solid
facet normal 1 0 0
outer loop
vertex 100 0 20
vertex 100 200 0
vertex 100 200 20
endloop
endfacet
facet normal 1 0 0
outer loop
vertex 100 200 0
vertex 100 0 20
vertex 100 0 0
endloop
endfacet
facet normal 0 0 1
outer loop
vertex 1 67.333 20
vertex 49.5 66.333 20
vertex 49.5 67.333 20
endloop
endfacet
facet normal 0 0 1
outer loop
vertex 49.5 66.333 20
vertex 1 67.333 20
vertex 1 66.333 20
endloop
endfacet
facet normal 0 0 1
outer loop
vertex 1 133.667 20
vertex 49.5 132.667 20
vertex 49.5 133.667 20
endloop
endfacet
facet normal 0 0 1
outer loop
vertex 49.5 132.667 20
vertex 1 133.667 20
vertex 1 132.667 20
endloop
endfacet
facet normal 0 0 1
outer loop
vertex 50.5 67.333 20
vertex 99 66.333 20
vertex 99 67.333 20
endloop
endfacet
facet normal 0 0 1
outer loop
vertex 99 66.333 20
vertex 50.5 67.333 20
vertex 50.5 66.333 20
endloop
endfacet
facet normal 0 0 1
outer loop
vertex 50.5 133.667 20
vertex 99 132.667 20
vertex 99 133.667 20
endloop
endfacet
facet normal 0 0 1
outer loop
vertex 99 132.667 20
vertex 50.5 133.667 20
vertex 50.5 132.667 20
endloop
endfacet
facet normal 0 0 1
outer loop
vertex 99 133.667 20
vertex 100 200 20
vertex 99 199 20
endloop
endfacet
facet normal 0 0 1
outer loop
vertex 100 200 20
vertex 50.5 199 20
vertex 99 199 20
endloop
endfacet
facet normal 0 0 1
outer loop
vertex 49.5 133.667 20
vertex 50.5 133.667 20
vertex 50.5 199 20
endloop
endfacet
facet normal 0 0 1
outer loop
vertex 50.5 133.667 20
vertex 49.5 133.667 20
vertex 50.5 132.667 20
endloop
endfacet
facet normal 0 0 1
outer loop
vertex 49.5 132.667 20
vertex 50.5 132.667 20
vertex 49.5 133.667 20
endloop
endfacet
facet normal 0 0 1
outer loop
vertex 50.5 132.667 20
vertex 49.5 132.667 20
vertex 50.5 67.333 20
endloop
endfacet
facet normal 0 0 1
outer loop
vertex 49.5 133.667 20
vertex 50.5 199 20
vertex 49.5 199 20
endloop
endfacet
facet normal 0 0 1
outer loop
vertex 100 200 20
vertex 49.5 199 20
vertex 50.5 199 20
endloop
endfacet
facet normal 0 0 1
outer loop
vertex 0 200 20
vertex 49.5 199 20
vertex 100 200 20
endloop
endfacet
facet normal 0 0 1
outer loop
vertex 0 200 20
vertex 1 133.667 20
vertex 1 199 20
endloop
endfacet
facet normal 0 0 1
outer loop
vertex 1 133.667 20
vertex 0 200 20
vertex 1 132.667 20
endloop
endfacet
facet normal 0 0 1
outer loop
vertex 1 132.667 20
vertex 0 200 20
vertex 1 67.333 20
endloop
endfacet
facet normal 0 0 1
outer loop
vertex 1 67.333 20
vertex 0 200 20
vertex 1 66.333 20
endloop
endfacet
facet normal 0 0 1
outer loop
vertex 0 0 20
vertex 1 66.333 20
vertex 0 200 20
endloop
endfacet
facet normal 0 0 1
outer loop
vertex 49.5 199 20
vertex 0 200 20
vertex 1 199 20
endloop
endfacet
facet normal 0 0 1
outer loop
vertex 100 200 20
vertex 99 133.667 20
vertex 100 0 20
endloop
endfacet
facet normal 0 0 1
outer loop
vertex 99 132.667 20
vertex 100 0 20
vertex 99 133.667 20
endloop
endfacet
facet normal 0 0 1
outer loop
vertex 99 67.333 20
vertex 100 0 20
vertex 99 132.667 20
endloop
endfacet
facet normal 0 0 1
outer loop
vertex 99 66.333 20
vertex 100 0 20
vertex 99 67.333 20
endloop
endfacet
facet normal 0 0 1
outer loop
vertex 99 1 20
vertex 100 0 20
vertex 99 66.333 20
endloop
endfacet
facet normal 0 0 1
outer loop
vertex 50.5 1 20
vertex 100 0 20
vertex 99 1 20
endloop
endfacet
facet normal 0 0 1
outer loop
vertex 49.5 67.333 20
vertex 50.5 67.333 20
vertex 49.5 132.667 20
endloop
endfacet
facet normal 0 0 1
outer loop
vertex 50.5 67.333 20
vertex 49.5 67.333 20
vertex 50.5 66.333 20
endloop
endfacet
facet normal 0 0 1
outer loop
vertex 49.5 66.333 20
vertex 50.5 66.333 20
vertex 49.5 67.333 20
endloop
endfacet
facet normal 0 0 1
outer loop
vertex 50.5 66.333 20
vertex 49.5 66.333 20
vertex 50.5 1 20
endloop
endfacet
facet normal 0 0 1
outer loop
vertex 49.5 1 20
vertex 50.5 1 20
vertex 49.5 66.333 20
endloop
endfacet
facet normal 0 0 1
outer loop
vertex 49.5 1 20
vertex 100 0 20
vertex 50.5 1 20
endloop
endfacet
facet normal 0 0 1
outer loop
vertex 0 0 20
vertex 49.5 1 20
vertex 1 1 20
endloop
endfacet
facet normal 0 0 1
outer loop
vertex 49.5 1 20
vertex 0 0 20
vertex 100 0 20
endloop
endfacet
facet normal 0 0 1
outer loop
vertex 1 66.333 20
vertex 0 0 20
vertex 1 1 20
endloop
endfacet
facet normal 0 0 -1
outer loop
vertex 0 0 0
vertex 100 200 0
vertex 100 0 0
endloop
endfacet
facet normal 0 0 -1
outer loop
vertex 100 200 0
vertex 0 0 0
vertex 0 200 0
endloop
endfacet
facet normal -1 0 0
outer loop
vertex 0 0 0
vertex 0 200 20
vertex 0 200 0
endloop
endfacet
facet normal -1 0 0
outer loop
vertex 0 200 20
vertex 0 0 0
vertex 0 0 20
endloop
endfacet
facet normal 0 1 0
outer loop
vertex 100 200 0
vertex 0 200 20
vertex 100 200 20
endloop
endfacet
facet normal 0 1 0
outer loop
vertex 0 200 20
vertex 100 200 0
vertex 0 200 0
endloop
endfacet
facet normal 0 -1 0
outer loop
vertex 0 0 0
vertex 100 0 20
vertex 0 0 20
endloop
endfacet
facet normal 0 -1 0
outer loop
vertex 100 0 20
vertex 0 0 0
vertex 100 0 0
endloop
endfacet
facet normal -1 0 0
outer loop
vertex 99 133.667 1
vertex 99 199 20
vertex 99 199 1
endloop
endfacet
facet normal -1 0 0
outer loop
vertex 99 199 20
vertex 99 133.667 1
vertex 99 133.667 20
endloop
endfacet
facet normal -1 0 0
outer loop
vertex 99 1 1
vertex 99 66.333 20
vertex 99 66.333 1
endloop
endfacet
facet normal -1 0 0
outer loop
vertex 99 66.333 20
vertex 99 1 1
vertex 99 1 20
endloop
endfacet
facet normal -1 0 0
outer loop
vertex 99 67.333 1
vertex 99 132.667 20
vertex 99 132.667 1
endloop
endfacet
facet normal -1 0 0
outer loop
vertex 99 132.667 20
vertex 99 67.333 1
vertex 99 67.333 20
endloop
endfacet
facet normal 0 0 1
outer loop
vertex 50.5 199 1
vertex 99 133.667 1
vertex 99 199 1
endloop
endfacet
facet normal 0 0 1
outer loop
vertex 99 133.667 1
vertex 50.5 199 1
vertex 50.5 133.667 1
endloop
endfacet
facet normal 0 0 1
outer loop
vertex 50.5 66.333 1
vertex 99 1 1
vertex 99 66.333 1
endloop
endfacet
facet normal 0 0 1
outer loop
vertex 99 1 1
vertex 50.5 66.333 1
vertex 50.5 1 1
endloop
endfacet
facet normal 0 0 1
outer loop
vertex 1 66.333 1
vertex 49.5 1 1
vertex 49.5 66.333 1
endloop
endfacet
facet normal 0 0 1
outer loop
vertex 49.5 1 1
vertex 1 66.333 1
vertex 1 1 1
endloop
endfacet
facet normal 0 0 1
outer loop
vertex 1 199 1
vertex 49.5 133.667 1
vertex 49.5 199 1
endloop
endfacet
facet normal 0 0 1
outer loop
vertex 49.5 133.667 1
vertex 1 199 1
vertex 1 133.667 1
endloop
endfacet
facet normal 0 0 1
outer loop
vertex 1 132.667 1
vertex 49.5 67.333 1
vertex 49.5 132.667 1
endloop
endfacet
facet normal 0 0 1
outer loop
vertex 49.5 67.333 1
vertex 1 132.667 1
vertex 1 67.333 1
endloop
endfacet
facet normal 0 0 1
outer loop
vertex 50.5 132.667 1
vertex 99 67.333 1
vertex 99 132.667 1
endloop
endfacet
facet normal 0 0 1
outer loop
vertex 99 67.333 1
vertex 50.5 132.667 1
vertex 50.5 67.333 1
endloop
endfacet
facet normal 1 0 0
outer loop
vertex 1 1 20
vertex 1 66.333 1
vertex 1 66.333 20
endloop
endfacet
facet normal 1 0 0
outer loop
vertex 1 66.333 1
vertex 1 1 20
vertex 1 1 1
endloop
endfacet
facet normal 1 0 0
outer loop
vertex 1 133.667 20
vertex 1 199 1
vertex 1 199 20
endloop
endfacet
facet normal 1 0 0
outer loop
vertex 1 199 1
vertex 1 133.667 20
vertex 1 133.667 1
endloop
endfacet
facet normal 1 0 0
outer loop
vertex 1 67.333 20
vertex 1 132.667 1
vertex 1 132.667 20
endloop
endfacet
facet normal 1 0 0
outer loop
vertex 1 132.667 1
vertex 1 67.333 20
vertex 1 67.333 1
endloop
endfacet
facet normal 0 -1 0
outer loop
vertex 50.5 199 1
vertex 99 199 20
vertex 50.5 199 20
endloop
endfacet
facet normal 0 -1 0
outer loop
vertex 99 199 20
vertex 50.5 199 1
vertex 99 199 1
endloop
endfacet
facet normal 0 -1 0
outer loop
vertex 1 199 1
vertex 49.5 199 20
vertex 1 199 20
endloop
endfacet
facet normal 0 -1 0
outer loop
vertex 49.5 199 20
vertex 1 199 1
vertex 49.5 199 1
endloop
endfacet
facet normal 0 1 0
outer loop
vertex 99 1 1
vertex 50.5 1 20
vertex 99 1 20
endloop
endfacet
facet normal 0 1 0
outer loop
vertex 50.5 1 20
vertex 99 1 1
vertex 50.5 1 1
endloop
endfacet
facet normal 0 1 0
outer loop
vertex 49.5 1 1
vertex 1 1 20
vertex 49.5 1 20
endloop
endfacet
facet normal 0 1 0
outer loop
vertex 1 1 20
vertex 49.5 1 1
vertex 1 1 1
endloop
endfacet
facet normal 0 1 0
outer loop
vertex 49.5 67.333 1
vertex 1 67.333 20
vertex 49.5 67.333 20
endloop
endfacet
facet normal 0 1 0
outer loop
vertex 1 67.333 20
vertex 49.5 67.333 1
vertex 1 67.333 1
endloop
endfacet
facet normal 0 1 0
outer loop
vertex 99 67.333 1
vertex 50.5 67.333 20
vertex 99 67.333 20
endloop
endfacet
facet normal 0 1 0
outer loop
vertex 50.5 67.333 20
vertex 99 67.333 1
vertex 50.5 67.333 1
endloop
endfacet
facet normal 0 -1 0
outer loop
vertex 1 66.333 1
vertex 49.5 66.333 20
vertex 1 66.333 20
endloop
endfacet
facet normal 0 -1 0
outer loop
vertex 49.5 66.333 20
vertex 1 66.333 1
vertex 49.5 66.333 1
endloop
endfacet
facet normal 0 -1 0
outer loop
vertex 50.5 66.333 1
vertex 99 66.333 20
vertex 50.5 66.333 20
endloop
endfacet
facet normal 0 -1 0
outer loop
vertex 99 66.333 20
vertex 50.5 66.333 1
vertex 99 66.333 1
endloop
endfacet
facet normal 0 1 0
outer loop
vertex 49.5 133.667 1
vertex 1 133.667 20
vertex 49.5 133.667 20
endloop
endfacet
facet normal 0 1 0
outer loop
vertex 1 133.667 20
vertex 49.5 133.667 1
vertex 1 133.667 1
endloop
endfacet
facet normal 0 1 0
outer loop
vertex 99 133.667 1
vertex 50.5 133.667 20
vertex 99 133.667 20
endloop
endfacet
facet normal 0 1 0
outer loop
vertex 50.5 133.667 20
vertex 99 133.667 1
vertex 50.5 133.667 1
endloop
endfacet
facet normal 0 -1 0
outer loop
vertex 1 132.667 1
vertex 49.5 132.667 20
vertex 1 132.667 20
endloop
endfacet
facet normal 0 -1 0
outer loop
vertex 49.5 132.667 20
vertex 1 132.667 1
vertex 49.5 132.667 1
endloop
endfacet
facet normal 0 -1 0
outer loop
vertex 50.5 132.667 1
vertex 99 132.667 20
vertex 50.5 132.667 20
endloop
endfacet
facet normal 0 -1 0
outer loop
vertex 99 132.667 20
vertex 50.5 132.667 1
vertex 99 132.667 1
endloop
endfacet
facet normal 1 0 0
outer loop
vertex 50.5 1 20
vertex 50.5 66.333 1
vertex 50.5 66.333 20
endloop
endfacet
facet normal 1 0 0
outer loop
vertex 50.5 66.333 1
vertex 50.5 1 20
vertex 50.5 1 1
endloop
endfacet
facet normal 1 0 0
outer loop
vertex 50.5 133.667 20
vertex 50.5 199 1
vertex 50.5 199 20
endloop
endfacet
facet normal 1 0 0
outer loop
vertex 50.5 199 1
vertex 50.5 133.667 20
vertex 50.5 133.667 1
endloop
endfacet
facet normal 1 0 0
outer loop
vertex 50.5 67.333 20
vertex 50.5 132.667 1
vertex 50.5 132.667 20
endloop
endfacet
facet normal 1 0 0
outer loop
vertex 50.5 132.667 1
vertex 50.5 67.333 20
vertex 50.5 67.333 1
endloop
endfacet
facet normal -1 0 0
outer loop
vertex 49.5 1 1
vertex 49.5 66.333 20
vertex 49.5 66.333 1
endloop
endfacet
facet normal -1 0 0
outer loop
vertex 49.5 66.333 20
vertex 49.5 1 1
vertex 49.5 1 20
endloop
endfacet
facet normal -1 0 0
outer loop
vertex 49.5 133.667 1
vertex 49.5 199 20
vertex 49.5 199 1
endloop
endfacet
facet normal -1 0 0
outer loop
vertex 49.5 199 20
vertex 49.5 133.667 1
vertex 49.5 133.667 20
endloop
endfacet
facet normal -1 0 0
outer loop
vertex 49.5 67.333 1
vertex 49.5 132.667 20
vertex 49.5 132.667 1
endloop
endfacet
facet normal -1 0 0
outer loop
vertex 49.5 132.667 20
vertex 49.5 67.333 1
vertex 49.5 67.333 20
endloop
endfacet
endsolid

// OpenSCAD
// Tray width
tray_width = 100;
// Tray lenght
tray_lenght = 200;
// Tray depth
tray_depth = 20;
// Columns
n_columns = 3;
// Rows
n_rows = 2;
// Wall width
wall_width = 1;
dwall = wall_width*2;
// Columns lengths
columns = [];
// Rows widths
rows = [];

module slot(width, lenght, depth, wall) {
    difference() {
        cube([width, lenght, depth]);
        translate([wall, wall, wall]) cube([width-wall*2, lenght-wall*2, depth]);
    }
    
}

function add(v) = [for(p=v) 1]*v;
function add_up_to(v, range) = add([for(i=[0:range]) v[i]]);


// Check columns
if (len(columns) != 0) {
    if (len(columns) != n_columns) {
        echo ("Column lenghts not especified for every column.");
    }
    if (add(columns) != 100) {
        echo ("Column lenghts do not add 100.");
    }
}
// Check rows
if (len(rows) != 0) {
    if (len(rows) != n_rows) {
        echo ("Row widths not especified for every row.");
    }
    if (add(rows) != 100) {
        echo ("Ros widths do not add 100.");
    }
}

slot(tray_width, tray_lenght, tray_depth, wall_width);
// Draw rows
if (len(rows) == 0) {
    inner_width = (tray_width - (n_rows + 1)*wall_width) / n_rows;
    for (r = [1:n_rows-1]) {
        current_row_offset = r*(wall_width+inner_width);
        translate([current_row_offset,0,0]) cube([wall_width,tray_lenght,tray_depth]);
    }
}
else{
    for (r = [0:n_rows-2]) {
        current_row_offset = (add_up_to(rows, r)/100 * tray_width)-wall_width/2;
        translate([current_row_offset,0,0]) cube([wall_width,tray_lenght,tray_depth]);
    }
}
// Draw columns
if (len(columns) == 0){
    inner_lenght = (tray_lenght - (n_columns + 1)*wall_width) / n_columns;
    for (c = [1:n_columns-1]){
        current_column_offset = c*(wall_width+inner_lenght);
        translate([0,current_column_offset,0]) cube([tray_width,wall_width,tray_depth]);
    }
}
else {
    for (c = [0:n_columns-2]){
        current_column_offset = (add_up_to(columns, c)/100 * tray_lenght)-wall_width/2;
        translate([0,current_column_offset,0]) cube([tray_width,wall_width,tray_depth]);
    }
}
